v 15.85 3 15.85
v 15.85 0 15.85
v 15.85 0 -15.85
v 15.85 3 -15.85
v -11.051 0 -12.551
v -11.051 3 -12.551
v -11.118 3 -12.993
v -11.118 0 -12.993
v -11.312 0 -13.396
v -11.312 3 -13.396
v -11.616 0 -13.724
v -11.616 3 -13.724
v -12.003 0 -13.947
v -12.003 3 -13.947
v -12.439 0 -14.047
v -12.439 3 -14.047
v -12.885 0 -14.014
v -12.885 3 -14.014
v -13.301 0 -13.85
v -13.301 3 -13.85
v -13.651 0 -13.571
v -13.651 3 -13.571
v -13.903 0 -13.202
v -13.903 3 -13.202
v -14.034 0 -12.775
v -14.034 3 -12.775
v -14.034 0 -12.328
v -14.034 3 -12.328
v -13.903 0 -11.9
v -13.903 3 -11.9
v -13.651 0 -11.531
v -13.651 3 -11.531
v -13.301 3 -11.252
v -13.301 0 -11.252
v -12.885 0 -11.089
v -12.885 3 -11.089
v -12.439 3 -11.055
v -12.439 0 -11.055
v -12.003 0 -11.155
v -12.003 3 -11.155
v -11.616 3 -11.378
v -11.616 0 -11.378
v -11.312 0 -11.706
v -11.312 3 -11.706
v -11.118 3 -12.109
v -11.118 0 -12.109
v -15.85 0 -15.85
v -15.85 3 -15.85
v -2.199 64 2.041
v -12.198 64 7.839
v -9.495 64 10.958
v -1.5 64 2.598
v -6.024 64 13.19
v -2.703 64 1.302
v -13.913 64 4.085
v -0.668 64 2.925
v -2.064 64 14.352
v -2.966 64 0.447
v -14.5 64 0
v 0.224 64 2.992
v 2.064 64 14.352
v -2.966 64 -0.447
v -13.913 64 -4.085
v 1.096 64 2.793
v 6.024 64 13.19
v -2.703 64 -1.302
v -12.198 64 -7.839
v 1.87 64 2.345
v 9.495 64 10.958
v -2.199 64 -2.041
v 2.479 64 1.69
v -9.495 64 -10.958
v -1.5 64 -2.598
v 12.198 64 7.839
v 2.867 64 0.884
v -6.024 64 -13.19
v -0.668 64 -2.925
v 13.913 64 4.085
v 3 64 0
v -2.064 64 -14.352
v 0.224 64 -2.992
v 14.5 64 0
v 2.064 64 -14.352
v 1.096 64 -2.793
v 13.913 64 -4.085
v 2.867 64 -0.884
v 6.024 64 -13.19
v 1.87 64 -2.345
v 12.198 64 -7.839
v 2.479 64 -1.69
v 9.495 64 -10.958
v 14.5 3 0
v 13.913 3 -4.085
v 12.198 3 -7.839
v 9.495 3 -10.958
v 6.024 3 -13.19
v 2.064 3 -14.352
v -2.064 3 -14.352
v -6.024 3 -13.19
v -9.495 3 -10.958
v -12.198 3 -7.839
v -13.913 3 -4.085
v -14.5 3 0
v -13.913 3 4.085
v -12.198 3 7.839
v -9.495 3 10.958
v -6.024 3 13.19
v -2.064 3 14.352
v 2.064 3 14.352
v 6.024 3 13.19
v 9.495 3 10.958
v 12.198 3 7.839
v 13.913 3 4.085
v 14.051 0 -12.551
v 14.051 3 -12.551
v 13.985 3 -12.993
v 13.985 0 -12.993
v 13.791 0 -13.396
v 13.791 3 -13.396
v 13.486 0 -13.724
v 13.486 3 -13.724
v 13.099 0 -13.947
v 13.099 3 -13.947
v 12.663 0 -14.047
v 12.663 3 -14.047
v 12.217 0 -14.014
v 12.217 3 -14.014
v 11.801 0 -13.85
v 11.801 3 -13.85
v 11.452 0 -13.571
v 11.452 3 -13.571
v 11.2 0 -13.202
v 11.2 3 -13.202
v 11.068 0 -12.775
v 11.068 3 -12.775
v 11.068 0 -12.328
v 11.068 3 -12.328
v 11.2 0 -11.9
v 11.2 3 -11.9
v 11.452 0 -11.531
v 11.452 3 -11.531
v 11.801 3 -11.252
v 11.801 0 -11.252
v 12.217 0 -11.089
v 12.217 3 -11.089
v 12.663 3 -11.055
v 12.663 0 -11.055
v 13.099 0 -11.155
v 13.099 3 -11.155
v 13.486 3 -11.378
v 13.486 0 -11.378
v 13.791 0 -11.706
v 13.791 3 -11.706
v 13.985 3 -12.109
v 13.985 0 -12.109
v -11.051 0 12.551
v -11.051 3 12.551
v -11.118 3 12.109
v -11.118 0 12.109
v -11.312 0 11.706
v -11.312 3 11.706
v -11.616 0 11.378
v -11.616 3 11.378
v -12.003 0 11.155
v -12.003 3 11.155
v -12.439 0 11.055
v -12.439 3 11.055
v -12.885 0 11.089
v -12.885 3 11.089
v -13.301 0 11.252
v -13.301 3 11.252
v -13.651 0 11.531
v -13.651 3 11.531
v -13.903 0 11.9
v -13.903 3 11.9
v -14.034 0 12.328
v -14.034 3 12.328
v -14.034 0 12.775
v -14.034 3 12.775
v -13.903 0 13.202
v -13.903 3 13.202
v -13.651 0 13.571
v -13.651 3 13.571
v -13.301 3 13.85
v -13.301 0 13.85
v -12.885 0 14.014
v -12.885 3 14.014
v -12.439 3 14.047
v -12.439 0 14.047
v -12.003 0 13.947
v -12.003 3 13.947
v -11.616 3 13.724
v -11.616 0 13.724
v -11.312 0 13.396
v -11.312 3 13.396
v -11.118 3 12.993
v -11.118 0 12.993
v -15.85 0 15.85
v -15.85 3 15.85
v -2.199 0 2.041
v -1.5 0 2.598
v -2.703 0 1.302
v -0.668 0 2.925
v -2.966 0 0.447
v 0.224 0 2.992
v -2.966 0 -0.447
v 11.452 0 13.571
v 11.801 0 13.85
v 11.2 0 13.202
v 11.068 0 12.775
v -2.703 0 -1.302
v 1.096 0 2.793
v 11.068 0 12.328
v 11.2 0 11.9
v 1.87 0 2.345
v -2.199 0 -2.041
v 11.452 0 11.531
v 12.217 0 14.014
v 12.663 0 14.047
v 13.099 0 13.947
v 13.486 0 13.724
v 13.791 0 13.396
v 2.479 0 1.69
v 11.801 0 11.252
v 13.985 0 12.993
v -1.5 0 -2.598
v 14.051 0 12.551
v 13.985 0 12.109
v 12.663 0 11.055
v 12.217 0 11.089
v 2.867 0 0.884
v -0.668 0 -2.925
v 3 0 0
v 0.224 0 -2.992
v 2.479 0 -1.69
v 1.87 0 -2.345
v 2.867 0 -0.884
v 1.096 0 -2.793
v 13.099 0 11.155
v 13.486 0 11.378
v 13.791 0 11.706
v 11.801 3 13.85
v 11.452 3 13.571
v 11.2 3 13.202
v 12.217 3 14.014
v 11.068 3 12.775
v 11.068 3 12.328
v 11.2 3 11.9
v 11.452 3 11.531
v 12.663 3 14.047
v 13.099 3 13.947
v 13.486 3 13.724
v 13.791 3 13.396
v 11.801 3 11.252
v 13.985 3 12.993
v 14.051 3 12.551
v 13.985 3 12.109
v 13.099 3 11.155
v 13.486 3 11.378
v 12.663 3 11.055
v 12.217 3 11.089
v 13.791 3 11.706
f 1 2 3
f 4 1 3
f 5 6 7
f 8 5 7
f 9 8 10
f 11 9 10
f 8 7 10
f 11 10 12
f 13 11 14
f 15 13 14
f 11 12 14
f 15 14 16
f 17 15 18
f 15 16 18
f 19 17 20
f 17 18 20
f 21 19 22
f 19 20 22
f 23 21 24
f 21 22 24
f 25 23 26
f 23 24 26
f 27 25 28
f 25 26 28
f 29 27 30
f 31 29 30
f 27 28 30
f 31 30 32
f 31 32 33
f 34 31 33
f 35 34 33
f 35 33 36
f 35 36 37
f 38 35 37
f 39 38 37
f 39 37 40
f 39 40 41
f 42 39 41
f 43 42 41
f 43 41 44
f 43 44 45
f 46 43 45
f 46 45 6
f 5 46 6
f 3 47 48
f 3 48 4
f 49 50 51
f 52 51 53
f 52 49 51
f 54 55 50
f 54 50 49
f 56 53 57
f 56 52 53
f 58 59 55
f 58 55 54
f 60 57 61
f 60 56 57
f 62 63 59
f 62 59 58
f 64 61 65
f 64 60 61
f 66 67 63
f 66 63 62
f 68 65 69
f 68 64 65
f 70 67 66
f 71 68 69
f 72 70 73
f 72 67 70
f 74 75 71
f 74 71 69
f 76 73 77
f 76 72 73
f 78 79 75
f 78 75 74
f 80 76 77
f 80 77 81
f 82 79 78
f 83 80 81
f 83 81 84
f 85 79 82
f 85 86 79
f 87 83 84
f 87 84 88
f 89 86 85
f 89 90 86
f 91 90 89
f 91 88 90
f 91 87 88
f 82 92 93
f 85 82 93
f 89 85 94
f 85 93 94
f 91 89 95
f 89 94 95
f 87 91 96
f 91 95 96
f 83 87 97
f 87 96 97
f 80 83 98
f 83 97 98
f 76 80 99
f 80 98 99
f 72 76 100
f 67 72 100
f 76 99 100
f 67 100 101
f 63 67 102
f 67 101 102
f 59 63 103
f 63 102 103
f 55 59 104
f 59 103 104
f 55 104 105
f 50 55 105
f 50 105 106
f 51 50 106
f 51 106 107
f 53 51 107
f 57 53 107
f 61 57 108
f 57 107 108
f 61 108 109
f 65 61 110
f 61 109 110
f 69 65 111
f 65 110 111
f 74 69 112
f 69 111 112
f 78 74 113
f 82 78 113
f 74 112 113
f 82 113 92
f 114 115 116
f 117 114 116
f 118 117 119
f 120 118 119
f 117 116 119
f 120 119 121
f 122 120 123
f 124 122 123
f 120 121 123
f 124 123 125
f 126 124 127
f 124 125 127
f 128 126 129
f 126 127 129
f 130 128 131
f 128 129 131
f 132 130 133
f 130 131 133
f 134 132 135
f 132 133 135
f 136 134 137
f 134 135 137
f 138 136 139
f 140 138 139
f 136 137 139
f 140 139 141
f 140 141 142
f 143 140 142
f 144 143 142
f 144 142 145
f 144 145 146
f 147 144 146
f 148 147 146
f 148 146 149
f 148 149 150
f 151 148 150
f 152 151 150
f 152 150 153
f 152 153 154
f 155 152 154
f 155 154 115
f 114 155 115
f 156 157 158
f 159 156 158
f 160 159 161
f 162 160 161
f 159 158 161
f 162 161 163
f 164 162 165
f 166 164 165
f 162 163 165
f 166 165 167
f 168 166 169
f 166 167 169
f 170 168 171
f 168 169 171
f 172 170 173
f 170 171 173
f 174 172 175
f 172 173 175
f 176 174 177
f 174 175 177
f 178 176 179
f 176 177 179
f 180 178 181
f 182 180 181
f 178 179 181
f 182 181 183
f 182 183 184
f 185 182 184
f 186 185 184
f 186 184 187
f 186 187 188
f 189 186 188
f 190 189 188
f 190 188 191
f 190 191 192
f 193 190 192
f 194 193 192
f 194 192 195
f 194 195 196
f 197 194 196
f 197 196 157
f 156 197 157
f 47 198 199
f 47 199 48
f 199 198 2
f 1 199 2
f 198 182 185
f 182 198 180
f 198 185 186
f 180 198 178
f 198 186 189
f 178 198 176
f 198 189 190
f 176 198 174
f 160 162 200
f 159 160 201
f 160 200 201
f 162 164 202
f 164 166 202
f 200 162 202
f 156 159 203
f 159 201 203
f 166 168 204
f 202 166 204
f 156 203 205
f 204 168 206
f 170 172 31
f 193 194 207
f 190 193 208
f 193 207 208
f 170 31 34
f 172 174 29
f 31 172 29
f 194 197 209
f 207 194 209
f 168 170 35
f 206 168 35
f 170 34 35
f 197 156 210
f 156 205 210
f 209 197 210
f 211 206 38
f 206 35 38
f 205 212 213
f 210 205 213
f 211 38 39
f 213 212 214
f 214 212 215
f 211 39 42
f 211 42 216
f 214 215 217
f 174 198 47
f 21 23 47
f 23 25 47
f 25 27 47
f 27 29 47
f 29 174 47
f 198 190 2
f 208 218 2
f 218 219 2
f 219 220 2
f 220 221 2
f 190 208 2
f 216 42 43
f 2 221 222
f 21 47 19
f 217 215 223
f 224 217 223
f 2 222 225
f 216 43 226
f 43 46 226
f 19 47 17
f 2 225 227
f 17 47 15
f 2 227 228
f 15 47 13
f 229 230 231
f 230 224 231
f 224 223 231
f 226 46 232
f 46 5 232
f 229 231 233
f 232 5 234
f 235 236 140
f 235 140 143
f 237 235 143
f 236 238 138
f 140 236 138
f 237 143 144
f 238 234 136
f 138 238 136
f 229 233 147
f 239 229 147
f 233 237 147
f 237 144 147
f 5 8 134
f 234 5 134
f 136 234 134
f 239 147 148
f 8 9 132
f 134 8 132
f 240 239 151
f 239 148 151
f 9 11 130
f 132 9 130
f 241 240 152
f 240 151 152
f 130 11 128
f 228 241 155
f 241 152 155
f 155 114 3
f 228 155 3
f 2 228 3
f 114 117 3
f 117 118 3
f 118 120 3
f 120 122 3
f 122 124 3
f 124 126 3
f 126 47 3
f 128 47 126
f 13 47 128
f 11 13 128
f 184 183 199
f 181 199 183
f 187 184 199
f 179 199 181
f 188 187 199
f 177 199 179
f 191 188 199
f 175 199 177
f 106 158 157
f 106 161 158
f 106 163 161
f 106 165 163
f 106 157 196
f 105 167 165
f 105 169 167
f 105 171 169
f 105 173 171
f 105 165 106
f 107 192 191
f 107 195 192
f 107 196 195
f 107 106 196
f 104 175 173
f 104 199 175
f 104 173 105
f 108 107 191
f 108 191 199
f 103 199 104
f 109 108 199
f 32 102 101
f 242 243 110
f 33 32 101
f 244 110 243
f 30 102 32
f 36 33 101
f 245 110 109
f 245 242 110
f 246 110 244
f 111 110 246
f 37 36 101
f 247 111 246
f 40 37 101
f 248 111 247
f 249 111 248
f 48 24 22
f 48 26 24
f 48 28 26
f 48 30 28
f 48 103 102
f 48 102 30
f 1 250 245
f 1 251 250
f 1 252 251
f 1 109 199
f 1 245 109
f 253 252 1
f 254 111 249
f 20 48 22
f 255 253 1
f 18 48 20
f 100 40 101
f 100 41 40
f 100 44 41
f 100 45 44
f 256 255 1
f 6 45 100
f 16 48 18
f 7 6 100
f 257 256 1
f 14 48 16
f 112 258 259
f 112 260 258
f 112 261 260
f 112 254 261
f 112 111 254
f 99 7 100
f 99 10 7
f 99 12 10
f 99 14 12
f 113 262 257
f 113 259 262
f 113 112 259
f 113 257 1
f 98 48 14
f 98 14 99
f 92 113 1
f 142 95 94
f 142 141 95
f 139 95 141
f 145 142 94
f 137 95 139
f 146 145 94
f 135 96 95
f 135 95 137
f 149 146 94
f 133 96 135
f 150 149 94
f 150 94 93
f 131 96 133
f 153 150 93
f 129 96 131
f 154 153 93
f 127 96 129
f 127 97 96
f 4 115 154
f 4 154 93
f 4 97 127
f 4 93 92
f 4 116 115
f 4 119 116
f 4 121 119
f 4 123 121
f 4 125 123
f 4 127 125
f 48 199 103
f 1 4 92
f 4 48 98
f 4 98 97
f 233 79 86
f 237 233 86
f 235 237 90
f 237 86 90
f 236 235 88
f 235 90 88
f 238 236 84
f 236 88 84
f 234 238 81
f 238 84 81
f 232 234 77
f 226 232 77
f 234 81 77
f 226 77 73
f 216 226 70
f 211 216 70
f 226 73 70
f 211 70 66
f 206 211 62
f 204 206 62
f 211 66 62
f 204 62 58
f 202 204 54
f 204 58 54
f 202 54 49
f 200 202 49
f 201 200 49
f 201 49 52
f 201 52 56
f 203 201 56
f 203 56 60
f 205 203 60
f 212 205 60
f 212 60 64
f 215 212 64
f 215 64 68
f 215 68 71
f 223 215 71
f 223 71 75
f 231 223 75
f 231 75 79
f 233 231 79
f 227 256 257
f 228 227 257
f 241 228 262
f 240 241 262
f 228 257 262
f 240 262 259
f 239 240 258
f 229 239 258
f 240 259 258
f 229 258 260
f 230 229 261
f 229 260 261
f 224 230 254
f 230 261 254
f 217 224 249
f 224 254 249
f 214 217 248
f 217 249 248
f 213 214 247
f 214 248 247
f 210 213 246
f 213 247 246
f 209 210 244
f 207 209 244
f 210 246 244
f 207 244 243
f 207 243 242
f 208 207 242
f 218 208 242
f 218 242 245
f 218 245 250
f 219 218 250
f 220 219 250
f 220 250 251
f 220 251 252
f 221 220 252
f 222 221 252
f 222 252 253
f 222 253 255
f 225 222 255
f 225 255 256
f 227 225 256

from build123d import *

# Parameters (mm, degrees)
SKETCH1_W             = 31.7
SKETCH1_H             = 31.7
BOSS_EXTRUDE1_DEPTH   = 3
SKETCH2_R             = 14.5
BOSS_EXTRUDE2_DEPTH   = 61
F_3_0MM_DOWEL_HOLE1_D = 3
SKETCH6_R             = 3
CUT_EXTRUDE1_DEPTH    = 65


with BuildPart() as part:
    # Sketch1 → Boss-Extrude1 (new body)
    with BuildSketch(Plane(origin=(0, 0, 0), x_dir=(1, 0, 0), z_dir=(0, 1, 0))):
        Rectangle(SKETCH1_W, SKETCH1_H)
    extrude(amount=BOSS_EXTRUDE1_DEPTH)

    # Sketch2 → Boss-Extrude2 (add)
    with BuildSketch(Plane(origin=(0, 3, 0), x_dir=(1, 0, 0), z_dir=(0, 1, 0))):
        Circle(SKETCH2_R)
    extrude(amount=BOSS_EXTRUDE2_DEPTH)

    # Ø3.0mm Dowel Hole1 (through all)
    with Locations(Plane(origin=(0, 0, 0), x_dir=(-1, 0, 0), z_dir=(0, -1, 0))):
        with Locations((12.551145366, -12.551145366), (-12.551145366, -12.551145366), (12.551145366, 12.551145366), (-12.551145366, 12.551145366)):
            Hole(F_3_0MM_DOWEL_HOLE1_D / 2)

    # Sketch6 → Cut-Extrude1 (cut, through all)
    with BuildSketch(Plane(origin=(0, 64, 0), x_dir=(1, 0, 0), z_dir=(0, 1, 0))):
        Circle(SKETCH6_R)
    extrude(amount=-CUT_EXTRUDE1_DEPTH, mode=Mode.SUBTRACT)


solid = part.part
